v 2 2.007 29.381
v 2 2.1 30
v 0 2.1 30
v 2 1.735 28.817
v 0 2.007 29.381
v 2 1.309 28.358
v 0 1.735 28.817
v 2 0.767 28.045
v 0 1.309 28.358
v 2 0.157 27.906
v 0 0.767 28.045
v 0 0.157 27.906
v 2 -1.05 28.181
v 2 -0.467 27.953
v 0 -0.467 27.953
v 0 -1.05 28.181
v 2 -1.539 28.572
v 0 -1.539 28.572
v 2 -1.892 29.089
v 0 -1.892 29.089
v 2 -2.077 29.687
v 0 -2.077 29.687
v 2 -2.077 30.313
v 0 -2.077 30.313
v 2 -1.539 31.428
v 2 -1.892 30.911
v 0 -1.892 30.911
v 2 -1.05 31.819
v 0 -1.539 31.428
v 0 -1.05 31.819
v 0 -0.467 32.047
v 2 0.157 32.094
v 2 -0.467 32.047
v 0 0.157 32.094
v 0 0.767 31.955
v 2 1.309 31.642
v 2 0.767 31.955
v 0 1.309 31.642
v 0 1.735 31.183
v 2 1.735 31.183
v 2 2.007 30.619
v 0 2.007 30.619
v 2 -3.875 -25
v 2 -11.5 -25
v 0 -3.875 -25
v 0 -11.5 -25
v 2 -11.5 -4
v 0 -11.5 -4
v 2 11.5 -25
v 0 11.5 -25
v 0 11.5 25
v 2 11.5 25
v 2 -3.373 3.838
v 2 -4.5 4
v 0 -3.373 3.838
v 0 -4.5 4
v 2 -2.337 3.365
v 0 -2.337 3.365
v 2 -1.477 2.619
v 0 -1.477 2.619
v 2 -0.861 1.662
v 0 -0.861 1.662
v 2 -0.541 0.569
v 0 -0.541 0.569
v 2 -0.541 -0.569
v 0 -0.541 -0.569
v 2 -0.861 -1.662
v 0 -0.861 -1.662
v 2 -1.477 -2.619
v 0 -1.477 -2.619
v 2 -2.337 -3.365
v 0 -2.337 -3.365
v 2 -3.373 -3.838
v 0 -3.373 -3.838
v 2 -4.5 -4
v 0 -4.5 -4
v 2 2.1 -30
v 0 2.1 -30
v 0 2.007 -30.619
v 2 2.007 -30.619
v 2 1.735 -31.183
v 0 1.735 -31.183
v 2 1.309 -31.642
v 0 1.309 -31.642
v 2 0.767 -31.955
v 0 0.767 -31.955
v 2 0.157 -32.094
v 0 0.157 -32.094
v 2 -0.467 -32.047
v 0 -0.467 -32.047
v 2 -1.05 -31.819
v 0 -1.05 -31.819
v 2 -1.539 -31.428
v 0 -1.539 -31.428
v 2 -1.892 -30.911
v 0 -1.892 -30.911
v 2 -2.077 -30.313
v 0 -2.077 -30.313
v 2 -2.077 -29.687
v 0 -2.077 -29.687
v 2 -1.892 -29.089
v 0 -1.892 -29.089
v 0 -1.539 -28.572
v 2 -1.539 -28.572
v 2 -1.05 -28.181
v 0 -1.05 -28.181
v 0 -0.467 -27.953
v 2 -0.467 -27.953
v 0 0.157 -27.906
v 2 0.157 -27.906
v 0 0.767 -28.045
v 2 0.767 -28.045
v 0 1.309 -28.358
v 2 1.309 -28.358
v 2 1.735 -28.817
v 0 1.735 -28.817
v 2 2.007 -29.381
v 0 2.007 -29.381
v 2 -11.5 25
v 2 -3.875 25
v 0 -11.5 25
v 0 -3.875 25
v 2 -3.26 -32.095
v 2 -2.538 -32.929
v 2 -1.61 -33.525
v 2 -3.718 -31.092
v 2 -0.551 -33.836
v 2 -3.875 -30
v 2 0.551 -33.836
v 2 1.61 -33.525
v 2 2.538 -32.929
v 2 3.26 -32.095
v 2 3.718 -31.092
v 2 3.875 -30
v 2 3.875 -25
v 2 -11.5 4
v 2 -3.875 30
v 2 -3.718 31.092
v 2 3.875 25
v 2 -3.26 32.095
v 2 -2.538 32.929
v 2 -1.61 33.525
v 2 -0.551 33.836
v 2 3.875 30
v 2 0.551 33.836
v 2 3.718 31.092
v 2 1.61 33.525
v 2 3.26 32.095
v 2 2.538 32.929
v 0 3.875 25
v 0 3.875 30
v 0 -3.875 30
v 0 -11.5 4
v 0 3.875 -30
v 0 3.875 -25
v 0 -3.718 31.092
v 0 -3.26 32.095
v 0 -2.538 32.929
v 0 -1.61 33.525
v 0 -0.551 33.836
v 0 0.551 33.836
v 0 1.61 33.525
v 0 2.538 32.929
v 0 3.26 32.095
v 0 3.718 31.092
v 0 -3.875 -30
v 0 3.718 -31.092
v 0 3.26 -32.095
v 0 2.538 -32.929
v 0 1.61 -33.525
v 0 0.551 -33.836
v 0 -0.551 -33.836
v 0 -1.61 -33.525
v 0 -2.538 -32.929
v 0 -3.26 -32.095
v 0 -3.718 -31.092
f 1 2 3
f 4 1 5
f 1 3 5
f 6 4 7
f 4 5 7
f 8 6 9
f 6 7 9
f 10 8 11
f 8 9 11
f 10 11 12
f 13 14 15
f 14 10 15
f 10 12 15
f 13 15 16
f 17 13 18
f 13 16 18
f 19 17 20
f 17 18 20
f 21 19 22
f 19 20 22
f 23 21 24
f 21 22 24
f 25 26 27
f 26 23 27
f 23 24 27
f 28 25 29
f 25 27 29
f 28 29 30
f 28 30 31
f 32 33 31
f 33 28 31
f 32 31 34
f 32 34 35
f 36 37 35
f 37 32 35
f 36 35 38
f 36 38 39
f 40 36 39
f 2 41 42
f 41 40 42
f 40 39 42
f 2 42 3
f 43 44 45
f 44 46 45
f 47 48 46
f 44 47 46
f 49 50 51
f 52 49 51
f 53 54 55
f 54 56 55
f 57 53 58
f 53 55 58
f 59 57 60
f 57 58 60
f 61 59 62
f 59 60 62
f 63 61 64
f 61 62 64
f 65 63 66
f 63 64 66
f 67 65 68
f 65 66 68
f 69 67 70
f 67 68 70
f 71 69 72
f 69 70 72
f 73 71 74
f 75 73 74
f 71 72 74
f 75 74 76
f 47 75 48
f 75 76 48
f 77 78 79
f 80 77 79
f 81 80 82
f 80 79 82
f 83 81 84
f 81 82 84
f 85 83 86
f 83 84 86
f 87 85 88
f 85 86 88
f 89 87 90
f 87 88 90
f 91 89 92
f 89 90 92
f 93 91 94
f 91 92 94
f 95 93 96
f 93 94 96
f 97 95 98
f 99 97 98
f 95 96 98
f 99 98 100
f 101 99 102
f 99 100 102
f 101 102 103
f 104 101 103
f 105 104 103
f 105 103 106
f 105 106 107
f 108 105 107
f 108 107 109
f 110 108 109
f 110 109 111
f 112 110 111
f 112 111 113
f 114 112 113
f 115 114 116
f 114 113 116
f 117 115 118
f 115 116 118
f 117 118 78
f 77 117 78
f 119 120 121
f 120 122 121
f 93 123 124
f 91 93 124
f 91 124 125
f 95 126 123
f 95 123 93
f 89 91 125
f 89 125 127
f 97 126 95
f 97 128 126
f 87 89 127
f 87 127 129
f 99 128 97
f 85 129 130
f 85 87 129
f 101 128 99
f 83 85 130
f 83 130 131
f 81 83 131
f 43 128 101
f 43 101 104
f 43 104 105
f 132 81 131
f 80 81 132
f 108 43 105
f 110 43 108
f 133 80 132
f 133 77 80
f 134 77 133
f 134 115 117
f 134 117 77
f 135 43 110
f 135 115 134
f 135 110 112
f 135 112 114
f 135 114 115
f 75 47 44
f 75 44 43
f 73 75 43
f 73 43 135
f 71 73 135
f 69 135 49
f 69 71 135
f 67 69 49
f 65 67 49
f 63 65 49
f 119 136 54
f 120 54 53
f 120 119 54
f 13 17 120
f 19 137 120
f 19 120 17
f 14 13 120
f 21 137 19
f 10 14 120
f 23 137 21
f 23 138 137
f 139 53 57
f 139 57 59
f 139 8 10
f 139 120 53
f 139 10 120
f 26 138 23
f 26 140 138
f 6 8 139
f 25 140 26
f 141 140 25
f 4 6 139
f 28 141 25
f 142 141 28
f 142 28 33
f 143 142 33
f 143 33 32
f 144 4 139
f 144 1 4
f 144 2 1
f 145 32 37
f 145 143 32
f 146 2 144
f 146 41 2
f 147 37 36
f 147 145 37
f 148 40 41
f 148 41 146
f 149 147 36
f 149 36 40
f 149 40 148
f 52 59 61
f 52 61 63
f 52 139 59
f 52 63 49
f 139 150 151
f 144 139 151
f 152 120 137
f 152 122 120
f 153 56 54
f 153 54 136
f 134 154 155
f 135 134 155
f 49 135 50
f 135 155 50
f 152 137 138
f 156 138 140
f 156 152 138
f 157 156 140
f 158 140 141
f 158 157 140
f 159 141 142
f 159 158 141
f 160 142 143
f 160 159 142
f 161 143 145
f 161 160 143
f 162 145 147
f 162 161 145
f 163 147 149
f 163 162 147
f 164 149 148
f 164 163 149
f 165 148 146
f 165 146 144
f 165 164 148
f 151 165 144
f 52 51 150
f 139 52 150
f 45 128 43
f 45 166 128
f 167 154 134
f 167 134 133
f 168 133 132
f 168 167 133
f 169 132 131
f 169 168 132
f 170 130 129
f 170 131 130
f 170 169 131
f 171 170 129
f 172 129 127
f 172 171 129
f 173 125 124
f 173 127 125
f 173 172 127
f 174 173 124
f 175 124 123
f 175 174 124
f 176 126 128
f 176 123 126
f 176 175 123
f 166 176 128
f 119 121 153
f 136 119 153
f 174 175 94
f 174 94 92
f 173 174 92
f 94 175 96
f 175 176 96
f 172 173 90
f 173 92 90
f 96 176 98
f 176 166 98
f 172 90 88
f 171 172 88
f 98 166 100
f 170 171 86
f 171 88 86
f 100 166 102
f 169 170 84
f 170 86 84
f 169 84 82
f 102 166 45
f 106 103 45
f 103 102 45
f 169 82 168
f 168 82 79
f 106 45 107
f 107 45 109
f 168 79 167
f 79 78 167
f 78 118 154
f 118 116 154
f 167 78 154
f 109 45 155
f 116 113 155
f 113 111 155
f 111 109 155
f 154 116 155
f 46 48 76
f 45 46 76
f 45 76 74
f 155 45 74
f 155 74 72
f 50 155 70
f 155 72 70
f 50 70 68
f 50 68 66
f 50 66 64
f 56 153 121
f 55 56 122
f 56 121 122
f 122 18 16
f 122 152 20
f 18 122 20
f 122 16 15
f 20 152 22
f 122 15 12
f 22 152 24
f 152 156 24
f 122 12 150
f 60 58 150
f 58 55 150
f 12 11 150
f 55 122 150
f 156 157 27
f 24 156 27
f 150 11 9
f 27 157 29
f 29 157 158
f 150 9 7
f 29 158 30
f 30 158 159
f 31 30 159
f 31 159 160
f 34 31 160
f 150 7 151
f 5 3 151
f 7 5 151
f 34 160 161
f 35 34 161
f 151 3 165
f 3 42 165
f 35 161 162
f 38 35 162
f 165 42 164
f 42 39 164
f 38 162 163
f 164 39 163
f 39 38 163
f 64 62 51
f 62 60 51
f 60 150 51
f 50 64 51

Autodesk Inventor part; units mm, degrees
ref_plane "YZ Plane" through (0, 0, 0) normal (1, 0, 0) x (0, 1, 0)
ref_plane "XZ Plane" through (0, 0, 0) normal (0, 1, 0) x (-1, 0, 0)
sketch "Sketch1" plane through (0, 0, 0) normal (1, 0, 0) x (0, 1, 0)
  line L0 (11.5, 25) -> (-11.5, 25)
  line L1 (-11.5, 25) -> (-11.5, -25)
  line L2 (-11.5, -25) -> (11.5, -25)
  line L3 (11.5, -25) -> (11.5, 25)
  line L4 (11.5, 25) -> (-11.5, -25) construction
  line L5 (-11.5, 25) -> (11.5, -25) construction
  circle A0 centre (0, -30) radius 3.875
  line L6 (3.875, -30) -> (3.875, -25)
  line L7 (-3.875, -30) -> (-3.875, -25)
  line L8 (0, -45.65) -> (0, 36.775) projected
  circle A1 centre (0, -30) radius 2.1
  line L9 (-16.1, 0) -> (16.1, 0) projected
  circle A2 centre (-4.5, 0) radius 4
  line L10 (-4.5, 4) -> (-11.5, 4)
  line L11 (-4.5, -4) -> (-11.5, -4)
  point P0 (0, 0)
  point P1 (-11.5, 1.75)
  point P2 (-11.5, -4.25)
  point P3 (4, 25)
  point P4 (-4, 25)
  dimension "d0" = 50
  dimension "d1" = 23
  dimension "d4" = 7.75
  dimension "d5" = 5
  dimension "d6" = 4.2
  dimension "d11" = 8
  dimension "d12" = 7
extrude "Extrusion1" add sketch "Sketch1" along normal blind 2 contours L3 L9 L8 L0 | L8 L9 A2 L10 L1 L0 | L3 L2 L8 L9 | L8 L2 L1 L11 A2 L9 | L8 A0 L7 L2 | L2 L6 A0 L8 | L8 A1 A0 | A0 L8 A1
mirror "Mirror1" about plane through (0, 0, 0) normal (0, 0, 1) of "Extrusion1"
properties part number "pokrywa_baza"
